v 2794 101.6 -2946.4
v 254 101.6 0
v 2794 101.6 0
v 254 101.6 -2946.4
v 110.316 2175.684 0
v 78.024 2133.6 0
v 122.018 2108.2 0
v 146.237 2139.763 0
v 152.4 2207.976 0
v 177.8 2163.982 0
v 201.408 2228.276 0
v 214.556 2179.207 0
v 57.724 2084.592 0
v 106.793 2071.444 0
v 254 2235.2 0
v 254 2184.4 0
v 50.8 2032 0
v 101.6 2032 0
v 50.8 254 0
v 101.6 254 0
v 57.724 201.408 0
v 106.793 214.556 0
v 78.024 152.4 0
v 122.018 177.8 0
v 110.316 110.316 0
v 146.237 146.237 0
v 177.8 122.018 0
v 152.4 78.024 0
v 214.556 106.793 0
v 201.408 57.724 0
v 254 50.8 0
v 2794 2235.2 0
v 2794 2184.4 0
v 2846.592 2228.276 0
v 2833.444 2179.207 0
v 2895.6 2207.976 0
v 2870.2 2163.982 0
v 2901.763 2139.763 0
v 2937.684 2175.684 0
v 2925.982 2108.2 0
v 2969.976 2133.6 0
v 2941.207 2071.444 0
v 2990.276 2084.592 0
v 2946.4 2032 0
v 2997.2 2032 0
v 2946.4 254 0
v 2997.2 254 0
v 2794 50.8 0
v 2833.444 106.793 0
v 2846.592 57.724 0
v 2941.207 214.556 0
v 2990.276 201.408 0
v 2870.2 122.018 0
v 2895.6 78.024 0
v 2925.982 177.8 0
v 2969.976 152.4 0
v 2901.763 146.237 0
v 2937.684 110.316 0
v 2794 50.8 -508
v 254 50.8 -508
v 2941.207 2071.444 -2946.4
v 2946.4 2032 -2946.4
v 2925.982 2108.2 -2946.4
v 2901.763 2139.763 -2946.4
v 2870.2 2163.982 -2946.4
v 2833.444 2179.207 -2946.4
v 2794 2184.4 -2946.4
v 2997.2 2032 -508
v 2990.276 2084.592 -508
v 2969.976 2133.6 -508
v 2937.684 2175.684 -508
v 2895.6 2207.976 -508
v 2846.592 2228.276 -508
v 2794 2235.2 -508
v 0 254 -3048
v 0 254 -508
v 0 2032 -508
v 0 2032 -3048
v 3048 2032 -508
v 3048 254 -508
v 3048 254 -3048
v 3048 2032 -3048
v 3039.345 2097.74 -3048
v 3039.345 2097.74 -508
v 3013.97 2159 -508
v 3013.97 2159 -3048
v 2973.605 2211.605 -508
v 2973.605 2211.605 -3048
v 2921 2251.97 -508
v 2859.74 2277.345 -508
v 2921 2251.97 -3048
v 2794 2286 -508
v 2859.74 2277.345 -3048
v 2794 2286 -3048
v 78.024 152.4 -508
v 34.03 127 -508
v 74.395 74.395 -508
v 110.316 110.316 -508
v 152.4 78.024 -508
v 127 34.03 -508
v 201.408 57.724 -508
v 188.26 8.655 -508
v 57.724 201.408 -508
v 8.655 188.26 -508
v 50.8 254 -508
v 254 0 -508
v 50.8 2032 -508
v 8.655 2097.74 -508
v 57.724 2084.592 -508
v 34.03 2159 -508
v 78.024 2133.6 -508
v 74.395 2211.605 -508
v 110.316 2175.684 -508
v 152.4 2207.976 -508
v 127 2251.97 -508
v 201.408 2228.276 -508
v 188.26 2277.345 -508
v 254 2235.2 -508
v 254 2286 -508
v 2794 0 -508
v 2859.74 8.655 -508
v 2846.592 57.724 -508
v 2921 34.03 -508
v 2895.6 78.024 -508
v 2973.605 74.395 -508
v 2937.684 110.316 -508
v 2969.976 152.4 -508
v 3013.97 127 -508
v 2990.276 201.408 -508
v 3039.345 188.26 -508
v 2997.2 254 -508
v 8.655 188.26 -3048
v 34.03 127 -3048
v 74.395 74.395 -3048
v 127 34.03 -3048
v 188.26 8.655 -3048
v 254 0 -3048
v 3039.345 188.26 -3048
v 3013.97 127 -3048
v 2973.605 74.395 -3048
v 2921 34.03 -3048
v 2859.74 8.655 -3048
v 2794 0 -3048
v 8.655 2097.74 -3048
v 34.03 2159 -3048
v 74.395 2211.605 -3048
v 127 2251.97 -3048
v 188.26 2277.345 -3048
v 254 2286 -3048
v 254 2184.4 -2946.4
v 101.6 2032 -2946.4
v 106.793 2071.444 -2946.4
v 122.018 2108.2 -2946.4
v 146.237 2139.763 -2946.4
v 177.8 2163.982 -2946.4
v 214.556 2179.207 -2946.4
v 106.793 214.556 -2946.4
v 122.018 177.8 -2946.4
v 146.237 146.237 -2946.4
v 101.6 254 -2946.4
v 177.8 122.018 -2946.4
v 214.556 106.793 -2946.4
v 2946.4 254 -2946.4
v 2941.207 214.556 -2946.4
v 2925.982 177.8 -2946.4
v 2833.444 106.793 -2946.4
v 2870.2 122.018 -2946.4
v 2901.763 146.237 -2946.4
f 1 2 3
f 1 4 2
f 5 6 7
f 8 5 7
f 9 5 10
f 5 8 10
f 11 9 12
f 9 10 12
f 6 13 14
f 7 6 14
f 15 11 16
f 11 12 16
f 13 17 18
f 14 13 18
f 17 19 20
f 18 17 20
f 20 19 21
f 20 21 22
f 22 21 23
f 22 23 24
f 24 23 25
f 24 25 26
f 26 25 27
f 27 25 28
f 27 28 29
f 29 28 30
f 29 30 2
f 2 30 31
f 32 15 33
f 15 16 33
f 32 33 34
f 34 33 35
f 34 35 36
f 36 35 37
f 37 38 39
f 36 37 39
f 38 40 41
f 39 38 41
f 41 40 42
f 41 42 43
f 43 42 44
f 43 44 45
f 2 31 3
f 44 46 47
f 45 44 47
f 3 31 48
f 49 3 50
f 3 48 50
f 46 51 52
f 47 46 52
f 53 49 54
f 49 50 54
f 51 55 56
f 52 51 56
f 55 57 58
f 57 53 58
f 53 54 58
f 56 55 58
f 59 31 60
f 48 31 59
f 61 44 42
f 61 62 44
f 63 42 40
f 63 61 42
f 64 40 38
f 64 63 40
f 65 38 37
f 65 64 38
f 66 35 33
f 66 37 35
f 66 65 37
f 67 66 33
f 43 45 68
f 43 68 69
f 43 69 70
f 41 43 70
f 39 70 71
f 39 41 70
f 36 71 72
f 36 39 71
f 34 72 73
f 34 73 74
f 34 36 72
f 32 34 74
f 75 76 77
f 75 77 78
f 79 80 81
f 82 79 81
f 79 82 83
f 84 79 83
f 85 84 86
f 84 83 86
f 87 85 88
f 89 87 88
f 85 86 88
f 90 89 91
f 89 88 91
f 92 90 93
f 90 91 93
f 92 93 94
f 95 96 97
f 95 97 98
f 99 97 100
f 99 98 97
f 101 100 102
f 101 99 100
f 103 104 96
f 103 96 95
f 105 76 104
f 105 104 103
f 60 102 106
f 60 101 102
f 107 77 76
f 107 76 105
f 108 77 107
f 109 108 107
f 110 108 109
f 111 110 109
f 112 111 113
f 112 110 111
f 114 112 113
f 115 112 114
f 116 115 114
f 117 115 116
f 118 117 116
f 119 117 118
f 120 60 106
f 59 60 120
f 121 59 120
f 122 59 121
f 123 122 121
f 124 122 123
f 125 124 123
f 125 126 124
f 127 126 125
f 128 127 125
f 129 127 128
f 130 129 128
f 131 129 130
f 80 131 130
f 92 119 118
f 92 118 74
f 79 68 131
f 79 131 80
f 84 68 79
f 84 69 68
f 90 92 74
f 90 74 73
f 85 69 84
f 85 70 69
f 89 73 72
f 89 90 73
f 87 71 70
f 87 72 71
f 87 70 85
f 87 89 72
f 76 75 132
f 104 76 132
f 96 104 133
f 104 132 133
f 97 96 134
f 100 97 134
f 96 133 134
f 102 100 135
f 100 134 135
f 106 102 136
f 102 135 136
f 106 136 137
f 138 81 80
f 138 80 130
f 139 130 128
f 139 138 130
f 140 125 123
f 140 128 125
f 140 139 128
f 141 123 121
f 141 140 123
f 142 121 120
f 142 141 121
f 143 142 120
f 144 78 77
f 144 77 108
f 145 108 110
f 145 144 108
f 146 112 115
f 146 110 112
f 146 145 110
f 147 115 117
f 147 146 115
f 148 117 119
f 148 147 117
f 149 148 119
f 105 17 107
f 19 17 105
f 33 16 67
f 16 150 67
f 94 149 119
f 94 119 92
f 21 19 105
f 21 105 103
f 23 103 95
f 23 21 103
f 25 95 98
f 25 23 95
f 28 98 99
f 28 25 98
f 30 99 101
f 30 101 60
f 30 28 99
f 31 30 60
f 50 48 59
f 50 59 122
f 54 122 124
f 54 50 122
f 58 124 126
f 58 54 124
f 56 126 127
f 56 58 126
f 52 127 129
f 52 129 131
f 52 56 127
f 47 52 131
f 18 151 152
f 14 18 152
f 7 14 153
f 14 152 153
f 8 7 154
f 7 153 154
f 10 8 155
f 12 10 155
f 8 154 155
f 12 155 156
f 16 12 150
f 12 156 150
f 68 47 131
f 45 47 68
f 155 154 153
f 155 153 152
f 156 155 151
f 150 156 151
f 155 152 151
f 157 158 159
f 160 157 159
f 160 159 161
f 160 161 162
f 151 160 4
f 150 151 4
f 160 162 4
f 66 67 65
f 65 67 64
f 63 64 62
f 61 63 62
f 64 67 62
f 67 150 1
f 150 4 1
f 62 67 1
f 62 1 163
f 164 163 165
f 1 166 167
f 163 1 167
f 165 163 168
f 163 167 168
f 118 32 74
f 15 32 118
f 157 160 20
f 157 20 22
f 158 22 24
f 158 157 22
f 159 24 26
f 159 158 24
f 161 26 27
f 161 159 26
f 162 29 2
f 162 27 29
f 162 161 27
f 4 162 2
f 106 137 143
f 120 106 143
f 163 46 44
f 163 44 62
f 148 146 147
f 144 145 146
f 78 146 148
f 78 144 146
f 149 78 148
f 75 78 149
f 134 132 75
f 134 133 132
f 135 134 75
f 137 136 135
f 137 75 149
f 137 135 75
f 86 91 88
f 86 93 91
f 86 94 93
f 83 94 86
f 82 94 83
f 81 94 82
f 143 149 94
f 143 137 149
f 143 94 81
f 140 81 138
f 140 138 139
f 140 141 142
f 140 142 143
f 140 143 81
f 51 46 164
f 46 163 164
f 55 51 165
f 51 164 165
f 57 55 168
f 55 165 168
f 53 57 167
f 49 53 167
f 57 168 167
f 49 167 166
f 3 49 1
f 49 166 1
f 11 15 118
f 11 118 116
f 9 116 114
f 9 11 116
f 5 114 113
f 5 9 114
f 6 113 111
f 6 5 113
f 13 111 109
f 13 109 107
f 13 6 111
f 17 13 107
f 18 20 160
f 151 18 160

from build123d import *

# Parameters (mm, degrees)
SKETCH2_W           = 3048
SKETCH2_H           = 3048
BOSS_EXTRUDE1_DEPTH = 2286
FILLET1_R           = 254
SHELL1_T            = -101.6
CUT_EXTRUDE1_DEPTH  = 508


with BuildPart() as part:
    # Sketch2 → Boss-Extrude1 (new body)
    with BuildSketch(Plane(origin=(0, 0, 0), x_dir=(1, 0, 0), z_dir=(0, 1, 0))):
        with Locations((1524, 1524)):
            Rectangle(SKETCH2_W, SKETCH2_H)
    extrude(amount=BOSS_EXTRUDE1_DEPTH)

    # Fillet1
    fillet1_edges = [part.edges().sort_by_distance(p)[0] for p in [
        (3048, 2286, -1524),
        (0, 2286, -1524),
        (3048, 0, -1524),
        (0, 0, -1524),
    ]]
    fillet(fillet1_edges, radius=FILLET1_R)

    # Shell1
    shell1_openings = [part.faces().sort_by_distance(p)[0] for p in [
        (1524, 1143, 0),
    ]]
    offset(amount=SHELL1_T, openings=shell1_openings, kind=Kind.INTERSECTION)

    # Sketch4 → Cut-Extrude1 (cut)
    with BuildSketch(Plane.XY):
        with BuildLine():
            Line((3048, 254), (3048, 2032))
            ThreePointArc((3048, 2032), (2973.605122421, 2211.605122421), (2794, 2286))
            Line((2794, 2286), (254, 2286))
            ThreePointArc((254, 2286), (74.394877579, 2211.605122421), (0, 2032))
            Line((0, 2032), (0, 254))
            ThreePointArc((0, 254), (74.394877579, 74.394877579), (254, 0))
            Line((254, 0), (2794, 0))
            ThreePointArc((2794, 0), (2973.605122421, 74.394877579), (3048, 254))
        make_face()
        with BuildLine():
            Line((2997.2, 254), (2997.2, 2032))
            ThreePointArc((2997.2, 2032), (2937.684097937, 2175.684097937), (2794, 2235.2))
            Line((2794, 2235.2), (254, 2235.2))
            ThreePointArc((254, 2235.2), (110.315902063, 2175.684097937), (50.8, 2032))
            Line((50.8, 2032), (50.8, 254))
            ThreePointArc((50.8, 254), (110.315902063, 110.315902063), (254, 50.8))
            Line((254, 50.8), (2794, 50.8))
            ThreePointArc((2794, 50.8), (2937.684097937, 110.315902063), (2997.2, 254))
        make_face(mode=Mode.SUBTRACT)
    extrude(amount=-CUT_EXTRUDE1_DEPTH, mode=Mode.SUBTRACT)


solid = part.part
